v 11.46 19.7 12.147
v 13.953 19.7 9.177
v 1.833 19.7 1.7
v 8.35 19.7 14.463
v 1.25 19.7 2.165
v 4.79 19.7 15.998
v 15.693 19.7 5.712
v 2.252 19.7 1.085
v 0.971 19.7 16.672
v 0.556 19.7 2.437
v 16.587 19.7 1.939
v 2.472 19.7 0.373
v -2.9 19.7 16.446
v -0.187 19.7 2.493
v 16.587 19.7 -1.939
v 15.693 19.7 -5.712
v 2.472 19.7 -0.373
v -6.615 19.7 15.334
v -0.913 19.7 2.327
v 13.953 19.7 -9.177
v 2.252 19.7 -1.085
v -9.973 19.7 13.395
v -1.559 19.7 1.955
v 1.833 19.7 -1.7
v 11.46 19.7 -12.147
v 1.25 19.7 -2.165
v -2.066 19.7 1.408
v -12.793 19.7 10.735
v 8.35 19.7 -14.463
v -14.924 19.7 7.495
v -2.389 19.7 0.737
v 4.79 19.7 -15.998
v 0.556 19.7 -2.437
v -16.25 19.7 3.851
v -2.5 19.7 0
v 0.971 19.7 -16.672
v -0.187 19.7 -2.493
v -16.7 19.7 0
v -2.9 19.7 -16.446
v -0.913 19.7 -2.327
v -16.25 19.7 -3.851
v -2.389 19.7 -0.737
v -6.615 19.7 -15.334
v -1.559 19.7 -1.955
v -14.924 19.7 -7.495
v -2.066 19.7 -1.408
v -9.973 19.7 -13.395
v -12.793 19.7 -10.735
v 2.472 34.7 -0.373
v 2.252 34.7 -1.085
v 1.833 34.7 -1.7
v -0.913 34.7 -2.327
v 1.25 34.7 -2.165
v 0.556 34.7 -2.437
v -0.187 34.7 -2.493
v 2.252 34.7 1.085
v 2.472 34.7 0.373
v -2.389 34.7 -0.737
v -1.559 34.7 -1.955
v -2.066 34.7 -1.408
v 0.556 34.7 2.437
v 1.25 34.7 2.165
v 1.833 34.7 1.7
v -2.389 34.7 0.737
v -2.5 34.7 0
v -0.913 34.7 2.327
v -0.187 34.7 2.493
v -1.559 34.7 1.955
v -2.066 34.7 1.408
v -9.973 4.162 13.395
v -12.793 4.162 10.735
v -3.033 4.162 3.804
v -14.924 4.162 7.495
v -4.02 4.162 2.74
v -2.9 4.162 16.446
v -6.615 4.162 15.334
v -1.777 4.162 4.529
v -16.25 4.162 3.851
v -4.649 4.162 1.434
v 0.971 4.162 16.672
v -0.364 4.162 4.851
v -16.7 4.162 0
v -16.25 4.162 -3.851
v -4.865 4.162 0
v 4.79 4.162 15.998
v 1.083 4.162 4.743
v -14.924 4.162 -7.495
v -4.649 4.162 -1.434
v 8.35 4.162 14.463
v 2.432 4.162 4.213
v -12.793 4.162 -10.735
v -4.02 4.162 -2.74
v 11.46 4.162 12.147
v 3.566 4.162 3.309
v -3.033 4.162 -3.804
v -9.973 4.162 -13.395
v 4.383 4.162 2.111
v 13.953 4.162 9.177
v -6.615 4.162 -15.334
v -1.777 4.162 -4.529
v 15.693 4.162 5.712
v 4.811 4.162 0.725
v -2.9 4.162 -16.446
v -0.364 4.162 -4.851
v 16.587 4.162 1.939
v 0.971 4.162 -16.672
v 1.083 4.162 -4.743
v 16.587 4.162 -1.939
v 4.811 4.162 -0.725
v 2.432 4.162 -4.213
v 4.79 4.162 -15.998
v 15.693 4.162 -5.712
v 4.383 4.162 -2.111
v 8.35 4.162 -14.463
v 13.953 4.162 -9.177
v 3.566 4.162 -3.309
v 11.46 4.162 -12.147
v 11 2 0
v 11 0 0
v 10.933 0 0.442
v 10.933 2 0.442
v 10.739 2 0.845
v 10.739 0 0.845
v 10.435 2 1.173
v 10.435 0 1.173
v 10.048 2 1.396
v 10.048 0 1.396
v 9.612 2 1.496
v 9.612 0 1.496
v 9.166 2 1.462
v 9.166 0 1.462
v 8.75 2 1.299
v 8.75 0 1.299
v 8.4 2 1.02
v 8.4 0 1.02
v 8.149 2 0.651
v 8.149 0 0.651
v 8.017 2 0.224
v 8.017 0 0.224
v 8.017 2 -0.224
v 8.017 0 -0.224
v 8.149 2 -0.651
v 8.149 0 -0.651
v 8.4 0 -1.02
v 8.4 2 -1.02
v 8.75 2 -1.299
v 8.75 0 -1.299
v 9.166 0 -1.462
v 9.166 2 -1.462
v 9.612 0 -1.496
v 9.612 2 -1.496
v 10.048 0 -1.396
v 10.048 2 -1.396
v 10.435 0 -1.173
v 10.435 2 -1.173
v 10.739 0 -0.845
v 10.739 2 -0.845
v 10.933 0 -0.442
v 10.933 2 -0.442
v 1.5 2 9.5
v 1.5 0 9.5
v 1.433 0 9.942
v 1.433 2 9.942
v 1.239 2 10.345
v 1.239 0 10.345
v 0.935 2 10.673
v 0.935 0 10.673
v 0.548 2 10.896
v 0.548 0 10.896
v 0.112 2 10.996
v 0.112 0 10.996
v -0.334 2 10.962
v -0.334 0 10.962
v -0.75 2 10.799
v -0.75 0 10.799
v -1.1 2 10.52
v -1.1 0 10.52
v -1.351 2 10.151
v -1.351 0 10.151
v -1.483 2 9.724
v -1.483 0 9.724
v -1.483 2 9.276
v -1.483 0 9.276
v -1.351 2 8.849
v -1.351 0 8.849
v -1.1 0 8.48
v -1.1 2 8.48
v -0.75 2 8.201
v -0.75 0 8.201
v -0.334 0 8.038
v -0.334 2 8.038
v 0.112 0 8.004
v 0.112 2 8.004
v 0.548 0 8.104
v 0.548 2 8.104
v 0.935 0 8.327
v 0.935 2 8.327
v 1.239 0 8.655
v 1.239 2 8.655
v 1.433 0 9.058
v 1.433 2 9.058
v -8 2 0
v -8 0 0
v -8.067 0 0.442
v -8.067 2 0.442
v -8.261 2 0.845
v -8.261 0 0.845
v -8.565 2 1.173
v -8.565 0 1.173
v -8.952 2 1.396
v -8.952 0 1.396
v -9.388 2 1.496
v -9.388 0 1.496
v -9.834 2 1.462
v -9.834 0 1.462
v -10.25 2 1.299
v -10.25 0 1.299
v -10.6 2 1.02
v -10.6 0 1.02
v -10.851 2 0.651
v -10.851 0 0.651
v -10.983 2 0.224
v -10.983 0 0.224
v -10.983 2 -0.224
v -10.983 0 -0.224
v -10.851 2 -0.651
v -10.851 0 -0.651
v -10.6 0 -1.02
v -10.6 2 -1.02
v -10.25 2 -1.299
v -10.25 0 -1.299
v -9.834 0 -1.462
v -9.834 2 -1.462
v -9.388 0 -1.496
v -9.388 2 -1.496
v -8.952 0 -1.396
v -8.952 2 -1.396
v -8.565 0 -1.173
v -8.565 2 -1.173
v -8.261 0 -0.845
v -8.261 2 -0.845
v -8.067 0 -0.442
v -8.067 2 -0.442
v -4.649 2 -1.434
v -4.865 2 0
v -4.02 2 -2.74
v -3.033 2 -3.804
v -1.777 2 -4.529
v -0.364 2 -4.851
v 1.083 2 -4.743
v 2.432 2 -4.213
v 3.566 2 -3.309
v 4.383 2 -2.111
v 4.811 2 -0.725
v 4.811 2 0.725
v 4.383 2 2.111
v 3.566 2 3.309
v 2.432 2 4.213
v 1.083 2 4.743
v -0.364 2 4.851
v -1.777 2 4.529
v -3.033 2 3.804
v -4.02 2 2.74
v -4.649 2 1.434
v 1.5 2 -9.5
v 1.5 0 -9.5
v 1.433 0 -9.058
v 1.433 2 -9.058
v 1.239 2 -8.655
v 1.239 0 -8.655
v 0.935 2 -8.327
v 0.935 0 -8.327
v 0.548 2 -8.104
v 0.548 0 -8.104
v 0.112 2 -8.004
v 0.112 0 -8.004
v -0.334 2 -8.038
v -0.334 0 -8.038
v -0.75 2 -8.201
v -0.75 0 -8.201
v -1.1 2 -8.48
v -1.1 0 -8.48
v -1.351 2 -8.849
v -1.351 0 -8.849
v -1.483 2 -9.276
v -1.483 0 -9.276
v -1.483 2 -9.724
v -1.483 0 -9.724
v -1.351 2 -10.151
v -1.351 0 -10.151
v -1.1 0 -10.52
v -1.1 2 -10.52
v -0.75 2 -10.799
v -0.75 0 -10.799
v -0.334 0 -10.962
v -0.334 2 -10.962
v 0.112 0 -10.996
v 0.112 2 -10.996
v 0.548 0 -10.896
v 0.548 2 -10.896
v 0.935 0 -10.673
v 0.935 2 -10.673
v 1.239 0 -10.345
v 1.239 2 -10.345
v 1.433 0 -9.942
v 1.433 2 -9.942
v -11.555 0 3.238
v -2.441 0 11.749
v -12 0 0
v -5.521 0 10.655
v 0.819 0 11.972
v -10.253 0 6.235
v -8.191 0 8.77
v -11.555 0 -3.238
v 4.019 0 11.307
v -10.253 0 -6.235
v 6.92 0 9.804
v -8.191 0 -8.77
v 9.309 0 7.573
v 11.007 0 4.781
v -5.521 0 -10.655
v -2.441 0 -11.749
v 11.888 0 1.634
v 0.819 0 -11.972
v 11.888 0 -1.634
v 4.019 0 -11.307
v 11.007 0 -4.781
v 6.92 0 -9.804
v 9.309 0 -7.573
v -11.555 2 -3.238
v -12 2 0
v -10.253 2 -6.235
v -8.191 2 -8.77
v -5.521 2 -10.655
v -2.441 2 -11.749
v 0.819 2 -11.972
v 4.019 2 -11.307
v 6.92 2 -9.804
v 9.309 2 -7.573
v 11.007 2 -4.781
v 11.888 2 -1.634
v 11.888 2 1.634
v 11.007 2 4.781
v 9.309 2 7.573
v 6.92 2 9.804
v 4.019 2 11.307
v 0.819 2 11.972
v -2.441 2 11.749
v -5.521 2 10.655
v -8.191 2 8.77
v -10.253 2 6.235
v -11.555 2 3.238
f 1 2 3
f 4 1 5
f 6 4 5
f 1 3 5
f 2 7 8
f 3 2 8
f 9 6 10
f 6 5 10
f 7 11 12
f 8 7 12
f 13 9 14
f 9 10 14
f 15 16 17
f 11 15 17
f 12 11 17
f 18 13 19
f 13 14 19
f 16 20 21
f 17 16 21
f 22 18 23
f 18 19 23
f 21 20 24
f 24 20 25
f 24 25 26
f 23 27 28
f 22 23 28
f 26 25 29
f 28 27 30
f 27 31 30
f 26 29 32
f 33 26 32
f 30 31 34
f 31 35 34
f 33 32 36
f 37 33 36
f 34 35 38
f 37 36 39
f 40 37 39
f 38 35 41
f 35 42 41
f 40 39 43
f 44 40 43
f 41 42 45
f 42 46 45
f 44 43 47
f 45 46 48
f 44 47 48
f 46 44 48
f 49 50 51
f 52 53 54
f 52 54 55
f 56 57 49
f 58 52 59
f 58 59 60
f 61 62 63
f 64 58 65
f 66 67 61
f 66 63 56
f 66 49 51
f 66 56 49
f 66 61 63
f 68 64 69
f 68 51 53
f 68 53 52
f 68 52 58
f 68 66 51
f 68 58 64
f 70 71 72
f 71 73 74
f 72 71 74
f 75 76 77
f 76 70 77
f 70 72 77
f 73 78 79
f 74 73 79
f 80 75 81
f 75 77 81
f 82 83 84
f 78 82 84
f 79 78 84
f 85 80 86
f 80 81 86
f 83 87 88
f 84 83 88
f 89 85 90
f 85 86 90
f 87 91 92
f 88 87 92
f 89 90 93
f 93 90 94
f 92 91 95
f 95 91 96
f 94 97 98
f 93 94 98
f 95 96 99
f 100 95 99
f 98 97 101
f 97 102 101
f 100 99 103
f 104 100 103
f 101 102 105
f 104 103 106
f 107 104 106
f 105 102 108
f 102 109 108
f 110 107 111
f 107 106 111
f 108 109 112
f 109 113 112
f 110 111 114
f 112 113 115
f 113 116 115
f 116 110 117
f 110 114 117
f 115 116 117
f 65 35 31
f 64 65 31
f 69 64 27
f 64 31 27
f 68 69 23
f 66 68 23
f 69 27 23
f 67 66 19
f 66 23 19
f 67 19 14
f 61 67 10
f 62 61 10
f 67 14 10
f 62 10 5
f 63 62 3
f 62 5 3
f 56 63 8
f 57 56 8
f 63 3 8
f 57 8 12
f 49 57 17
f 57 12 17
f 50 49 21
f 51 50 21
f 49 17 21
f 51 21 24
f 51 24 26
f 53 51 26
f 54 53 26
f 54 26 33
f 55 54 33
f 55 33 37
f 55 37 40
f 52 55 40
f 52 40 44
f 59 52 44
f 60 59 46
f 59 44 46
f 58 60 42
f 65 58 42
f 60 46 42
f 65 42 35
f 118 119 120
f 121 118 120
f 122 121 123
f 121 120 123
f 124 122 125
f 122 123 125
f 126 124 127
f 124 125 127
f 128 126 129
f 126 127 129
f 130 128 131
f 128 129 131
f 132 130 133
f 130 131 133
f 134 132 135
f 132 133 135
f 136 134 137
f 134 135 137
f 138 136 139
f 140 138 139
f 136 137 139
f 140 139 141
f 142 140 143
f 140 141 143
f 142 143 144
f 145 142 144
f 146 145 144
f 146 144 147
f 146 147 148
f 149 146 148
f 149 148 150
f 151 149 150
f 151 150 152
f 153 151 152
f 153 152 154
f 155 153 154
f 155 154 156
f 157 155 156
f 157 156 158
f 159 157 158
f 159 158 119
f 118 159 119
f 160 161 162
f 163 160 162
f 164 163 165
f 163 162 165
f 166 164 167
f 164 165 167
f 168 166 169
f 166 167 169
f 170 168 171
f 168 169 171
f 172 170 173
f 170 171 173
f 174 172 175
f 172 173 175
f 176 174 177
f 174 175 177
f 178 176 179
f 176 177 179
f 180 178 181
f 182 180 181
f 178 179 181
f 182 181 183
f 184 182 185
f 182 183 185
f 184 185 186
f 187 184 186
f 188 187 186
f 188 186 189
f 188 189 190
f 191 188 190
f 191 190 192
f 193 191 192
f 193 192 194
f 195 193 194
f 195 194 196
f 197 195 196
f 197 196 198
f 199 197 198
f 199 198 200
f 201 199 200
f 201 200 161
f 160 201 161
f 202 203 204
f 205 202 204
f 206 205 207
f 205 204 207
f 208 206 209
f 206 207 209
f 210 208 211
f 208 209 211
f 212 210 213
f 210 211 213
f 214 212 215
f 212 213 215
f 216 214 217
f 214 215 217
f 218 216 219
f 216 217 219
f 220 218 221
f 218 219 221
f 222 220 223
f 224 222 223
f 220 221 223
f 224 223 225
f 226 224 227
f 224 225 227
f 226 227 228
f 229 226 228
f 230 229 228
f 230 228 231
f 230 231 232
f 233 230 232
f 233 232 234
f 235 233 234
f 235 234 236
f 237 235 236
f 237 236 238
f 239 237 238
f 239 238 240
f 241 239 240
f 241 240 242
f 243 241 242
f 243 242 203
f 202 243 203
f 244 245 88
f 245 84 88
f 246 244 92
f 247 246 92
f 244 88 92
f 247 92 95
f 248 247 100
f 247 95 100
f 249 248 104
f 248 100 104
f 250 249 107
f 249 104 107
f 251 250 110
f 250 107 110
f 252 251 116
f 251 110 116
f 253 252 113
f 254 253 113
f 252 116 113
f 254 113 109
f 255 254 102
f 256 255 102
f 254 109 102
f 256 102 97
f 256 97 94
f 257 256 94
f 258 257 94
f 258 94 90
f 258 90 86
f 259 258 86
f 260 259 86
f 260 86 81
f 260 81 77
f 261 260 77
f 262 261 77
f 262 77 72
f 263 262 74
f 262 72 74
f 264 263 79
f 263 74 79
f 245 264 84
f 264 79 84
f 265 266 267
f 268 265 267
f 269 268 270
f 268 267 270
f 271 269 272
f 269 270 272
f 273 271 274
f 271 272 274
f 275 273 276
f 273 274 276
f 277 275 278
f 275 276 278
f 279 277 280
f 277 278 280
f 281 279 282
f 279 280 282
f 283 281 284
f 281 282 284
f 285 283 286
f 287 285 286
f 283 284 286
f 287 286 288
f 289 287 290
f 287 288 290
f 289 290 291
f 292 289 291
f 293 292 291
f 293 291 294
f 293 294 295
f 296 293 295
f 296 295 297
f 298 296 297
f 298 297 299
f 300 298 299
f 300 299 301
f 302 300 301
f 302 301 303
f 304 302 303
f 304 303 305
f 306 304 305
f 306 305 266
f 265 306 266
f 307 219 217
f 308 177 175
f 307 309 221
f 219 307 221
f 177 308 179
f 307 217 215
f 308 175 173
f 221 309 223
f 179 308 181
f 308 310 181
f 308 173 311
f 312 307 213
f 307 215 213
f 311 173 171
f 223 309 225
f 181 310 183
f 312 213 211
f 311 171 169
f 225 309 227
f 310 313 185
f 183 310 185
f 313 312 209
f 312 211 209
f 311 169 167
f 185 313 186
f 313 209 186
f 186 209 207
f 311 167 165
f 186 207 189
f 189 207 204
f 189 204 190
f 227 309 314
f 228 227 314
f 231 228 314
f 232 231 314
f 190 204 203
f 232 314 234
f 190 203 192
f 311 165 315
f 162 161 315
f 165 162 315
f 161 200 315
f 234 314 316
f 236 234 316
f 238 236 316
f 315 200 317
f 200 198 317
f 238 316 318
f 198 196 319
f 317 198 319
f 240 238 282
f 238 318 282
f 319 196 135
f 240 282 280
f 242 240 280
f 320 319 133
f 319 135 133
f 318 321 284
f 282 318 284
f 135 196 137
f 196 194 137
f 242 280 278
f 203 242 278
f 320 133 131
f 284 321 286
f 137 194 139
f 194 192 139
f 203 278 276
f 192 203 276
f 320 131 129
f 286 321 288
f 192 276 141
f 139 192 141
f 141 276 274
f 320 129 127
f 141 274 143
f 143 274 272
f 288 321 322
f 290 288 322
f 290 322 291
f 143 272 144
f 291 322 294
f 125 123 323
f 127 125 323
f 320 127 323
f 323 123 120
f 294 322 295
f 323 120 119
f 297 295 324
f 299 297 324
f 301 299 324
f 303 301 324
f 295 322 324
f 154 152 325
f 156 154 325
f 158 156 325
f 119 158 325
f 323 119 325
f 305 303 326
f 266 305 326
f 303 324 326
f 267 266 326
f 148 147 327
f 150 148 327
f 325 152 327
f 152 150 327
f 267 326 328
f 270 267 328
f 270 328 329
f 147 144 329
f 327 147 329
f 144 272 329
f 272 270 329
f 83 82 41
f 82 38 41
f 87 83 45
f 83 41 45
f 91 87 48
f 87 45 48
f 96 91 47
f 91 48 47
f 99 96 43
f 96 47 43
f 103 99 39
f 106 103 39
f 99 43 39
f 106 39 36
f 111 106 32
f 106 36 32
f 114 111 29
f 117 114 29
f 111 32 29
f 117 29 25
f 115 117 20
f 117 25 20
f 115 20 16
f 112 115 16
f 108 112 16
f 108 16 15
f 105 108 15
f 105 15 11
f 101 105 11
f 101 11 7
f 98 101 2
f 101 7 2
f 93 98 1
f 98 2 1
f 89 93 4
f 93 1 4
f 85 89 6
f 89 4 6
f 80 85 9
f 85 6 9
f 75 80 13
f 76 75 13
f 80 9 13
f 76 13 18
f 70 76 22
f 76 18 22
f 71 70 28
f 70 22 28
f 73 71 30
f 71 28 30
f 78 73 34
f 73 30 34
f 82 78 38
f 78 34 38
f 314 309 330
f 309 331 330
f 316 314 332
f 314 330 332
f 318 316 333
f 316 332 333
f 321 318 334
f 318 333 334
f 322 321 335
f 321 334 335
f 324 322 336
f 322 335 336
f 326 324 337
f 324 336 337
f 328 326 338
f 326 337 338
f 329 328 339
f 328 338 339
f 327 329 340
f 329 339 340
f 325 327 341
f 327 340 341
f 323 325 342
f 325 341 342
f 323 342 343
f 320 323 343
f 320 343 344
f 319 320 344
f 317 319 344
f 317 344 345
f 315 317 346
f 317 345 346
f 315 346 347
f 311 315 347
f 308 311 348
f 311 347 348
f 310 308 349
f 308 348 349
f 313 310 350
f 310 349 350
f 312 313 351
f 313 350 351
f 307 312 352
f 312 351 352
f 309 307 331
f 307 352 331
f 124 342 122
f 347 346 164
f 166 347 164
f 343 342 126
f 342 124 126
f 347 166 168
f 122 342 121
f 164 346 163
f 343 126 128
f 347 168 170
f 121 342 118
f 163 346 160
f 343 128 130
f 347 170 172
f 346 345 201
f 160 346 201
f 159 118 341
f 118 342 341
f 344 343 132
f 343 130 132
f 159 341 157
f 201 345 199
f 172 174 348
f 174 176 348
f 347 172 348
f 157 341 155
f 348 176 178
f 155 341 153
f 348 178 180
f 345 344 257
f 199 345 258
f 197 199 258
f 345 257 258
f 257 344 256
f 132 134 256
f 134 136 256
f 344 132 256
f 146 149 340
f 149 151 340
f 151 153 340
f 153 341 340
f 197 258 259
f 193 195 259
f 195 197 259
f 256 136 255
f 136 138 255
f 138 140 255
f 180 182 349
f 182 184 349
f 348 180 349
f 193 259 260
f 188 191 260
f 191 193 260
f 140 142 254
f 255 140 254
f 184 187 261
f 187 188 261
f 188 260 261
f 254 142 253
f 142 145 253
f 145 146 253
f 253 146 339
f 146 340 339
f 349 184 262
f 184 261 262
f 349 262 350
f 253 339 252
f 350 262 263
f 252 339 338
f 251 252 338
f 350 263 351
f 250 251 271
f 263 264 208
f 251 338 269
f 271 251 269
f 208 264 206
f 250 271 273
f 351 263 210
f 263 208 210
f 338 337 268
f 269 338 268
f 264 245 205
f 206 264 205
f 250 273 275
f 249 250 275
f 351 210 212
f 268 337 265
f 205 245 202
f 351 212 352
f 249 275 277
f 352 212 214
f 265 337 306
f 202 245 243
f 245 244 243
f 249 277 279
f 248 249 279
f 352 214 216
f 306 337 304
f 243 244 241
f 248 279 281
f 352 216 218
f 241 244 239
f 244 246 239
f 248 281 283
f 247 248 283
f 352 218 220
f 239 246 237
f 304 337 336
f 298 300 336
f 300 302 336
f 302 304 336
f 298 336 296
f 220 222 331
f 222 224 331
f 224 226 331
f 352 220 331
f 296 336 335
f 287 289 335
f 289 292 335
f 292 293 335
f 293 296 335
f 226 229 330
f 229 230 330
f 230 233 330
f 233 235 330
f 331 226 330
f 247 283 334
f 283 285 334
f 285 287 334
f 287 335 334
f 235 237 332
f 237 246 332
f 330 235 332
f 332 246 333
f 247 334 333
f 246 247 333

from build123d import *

# Parameters (mm, degrees)
SKETCH4_R           = 2.5
BOSS_EXTRUDE1_DEPTH = 15
SKETCH5_R           = 1.5
CUT_EXTRUDE3_DEPTH  = 4


with BuildPart() as part:
    # Sketch3 → Revolve1 (revolve)
    with BuildSketch(Plane.XY, mode=Mode.PRIVATE) as revolve1_sk:
        Polygon((0, 0), (12, 0), (12, 2), (4.864864865, 2), (4.864864865, 4.162162162), (16.7, 4.162162162), (16.7, 19.7), (0, 19.7), align=None)
    revolve(revolve1_sk.sketch.rotate(Axis((0, 19.7, 0), (0, -1, 0)), 180), axis=Axis((0, 19.7, 0), (0, -1, 0)))

    # Sketch4 → Boss-Extrude1 (add)
    with BuildSketch(Plane(origin=(0, 19.7, 0), x_dir=(1, 0, 0), z_dir=(0, 1, 0))):
        with Locations(Location((0, 0, 0), (0, 0, 180))):
            Circle(SKETCH4_R)
    extrude(amount=BOSS_EXTRUDE1_DEPTH)

    # Sketch5 → Cut-Extrude3 (cut)
    with BuildSketch(Plane.XZ):
        with Locations((9.5, 0)):
            Circle(SKETCH5_R)
        with Locations((0, -9.5)):
            Circle(SKETCH5_R)
        with Locations((-9.5, 0)):
            Circle(SKETCH5_R)
        with Locations((0, 9.5)):
            Circle(SKETCH5_R)
    extrude(amount=-CUT_EXTRUDE3_DEPTH, mode=Mode.SUBTRACT)


solid = part.part
